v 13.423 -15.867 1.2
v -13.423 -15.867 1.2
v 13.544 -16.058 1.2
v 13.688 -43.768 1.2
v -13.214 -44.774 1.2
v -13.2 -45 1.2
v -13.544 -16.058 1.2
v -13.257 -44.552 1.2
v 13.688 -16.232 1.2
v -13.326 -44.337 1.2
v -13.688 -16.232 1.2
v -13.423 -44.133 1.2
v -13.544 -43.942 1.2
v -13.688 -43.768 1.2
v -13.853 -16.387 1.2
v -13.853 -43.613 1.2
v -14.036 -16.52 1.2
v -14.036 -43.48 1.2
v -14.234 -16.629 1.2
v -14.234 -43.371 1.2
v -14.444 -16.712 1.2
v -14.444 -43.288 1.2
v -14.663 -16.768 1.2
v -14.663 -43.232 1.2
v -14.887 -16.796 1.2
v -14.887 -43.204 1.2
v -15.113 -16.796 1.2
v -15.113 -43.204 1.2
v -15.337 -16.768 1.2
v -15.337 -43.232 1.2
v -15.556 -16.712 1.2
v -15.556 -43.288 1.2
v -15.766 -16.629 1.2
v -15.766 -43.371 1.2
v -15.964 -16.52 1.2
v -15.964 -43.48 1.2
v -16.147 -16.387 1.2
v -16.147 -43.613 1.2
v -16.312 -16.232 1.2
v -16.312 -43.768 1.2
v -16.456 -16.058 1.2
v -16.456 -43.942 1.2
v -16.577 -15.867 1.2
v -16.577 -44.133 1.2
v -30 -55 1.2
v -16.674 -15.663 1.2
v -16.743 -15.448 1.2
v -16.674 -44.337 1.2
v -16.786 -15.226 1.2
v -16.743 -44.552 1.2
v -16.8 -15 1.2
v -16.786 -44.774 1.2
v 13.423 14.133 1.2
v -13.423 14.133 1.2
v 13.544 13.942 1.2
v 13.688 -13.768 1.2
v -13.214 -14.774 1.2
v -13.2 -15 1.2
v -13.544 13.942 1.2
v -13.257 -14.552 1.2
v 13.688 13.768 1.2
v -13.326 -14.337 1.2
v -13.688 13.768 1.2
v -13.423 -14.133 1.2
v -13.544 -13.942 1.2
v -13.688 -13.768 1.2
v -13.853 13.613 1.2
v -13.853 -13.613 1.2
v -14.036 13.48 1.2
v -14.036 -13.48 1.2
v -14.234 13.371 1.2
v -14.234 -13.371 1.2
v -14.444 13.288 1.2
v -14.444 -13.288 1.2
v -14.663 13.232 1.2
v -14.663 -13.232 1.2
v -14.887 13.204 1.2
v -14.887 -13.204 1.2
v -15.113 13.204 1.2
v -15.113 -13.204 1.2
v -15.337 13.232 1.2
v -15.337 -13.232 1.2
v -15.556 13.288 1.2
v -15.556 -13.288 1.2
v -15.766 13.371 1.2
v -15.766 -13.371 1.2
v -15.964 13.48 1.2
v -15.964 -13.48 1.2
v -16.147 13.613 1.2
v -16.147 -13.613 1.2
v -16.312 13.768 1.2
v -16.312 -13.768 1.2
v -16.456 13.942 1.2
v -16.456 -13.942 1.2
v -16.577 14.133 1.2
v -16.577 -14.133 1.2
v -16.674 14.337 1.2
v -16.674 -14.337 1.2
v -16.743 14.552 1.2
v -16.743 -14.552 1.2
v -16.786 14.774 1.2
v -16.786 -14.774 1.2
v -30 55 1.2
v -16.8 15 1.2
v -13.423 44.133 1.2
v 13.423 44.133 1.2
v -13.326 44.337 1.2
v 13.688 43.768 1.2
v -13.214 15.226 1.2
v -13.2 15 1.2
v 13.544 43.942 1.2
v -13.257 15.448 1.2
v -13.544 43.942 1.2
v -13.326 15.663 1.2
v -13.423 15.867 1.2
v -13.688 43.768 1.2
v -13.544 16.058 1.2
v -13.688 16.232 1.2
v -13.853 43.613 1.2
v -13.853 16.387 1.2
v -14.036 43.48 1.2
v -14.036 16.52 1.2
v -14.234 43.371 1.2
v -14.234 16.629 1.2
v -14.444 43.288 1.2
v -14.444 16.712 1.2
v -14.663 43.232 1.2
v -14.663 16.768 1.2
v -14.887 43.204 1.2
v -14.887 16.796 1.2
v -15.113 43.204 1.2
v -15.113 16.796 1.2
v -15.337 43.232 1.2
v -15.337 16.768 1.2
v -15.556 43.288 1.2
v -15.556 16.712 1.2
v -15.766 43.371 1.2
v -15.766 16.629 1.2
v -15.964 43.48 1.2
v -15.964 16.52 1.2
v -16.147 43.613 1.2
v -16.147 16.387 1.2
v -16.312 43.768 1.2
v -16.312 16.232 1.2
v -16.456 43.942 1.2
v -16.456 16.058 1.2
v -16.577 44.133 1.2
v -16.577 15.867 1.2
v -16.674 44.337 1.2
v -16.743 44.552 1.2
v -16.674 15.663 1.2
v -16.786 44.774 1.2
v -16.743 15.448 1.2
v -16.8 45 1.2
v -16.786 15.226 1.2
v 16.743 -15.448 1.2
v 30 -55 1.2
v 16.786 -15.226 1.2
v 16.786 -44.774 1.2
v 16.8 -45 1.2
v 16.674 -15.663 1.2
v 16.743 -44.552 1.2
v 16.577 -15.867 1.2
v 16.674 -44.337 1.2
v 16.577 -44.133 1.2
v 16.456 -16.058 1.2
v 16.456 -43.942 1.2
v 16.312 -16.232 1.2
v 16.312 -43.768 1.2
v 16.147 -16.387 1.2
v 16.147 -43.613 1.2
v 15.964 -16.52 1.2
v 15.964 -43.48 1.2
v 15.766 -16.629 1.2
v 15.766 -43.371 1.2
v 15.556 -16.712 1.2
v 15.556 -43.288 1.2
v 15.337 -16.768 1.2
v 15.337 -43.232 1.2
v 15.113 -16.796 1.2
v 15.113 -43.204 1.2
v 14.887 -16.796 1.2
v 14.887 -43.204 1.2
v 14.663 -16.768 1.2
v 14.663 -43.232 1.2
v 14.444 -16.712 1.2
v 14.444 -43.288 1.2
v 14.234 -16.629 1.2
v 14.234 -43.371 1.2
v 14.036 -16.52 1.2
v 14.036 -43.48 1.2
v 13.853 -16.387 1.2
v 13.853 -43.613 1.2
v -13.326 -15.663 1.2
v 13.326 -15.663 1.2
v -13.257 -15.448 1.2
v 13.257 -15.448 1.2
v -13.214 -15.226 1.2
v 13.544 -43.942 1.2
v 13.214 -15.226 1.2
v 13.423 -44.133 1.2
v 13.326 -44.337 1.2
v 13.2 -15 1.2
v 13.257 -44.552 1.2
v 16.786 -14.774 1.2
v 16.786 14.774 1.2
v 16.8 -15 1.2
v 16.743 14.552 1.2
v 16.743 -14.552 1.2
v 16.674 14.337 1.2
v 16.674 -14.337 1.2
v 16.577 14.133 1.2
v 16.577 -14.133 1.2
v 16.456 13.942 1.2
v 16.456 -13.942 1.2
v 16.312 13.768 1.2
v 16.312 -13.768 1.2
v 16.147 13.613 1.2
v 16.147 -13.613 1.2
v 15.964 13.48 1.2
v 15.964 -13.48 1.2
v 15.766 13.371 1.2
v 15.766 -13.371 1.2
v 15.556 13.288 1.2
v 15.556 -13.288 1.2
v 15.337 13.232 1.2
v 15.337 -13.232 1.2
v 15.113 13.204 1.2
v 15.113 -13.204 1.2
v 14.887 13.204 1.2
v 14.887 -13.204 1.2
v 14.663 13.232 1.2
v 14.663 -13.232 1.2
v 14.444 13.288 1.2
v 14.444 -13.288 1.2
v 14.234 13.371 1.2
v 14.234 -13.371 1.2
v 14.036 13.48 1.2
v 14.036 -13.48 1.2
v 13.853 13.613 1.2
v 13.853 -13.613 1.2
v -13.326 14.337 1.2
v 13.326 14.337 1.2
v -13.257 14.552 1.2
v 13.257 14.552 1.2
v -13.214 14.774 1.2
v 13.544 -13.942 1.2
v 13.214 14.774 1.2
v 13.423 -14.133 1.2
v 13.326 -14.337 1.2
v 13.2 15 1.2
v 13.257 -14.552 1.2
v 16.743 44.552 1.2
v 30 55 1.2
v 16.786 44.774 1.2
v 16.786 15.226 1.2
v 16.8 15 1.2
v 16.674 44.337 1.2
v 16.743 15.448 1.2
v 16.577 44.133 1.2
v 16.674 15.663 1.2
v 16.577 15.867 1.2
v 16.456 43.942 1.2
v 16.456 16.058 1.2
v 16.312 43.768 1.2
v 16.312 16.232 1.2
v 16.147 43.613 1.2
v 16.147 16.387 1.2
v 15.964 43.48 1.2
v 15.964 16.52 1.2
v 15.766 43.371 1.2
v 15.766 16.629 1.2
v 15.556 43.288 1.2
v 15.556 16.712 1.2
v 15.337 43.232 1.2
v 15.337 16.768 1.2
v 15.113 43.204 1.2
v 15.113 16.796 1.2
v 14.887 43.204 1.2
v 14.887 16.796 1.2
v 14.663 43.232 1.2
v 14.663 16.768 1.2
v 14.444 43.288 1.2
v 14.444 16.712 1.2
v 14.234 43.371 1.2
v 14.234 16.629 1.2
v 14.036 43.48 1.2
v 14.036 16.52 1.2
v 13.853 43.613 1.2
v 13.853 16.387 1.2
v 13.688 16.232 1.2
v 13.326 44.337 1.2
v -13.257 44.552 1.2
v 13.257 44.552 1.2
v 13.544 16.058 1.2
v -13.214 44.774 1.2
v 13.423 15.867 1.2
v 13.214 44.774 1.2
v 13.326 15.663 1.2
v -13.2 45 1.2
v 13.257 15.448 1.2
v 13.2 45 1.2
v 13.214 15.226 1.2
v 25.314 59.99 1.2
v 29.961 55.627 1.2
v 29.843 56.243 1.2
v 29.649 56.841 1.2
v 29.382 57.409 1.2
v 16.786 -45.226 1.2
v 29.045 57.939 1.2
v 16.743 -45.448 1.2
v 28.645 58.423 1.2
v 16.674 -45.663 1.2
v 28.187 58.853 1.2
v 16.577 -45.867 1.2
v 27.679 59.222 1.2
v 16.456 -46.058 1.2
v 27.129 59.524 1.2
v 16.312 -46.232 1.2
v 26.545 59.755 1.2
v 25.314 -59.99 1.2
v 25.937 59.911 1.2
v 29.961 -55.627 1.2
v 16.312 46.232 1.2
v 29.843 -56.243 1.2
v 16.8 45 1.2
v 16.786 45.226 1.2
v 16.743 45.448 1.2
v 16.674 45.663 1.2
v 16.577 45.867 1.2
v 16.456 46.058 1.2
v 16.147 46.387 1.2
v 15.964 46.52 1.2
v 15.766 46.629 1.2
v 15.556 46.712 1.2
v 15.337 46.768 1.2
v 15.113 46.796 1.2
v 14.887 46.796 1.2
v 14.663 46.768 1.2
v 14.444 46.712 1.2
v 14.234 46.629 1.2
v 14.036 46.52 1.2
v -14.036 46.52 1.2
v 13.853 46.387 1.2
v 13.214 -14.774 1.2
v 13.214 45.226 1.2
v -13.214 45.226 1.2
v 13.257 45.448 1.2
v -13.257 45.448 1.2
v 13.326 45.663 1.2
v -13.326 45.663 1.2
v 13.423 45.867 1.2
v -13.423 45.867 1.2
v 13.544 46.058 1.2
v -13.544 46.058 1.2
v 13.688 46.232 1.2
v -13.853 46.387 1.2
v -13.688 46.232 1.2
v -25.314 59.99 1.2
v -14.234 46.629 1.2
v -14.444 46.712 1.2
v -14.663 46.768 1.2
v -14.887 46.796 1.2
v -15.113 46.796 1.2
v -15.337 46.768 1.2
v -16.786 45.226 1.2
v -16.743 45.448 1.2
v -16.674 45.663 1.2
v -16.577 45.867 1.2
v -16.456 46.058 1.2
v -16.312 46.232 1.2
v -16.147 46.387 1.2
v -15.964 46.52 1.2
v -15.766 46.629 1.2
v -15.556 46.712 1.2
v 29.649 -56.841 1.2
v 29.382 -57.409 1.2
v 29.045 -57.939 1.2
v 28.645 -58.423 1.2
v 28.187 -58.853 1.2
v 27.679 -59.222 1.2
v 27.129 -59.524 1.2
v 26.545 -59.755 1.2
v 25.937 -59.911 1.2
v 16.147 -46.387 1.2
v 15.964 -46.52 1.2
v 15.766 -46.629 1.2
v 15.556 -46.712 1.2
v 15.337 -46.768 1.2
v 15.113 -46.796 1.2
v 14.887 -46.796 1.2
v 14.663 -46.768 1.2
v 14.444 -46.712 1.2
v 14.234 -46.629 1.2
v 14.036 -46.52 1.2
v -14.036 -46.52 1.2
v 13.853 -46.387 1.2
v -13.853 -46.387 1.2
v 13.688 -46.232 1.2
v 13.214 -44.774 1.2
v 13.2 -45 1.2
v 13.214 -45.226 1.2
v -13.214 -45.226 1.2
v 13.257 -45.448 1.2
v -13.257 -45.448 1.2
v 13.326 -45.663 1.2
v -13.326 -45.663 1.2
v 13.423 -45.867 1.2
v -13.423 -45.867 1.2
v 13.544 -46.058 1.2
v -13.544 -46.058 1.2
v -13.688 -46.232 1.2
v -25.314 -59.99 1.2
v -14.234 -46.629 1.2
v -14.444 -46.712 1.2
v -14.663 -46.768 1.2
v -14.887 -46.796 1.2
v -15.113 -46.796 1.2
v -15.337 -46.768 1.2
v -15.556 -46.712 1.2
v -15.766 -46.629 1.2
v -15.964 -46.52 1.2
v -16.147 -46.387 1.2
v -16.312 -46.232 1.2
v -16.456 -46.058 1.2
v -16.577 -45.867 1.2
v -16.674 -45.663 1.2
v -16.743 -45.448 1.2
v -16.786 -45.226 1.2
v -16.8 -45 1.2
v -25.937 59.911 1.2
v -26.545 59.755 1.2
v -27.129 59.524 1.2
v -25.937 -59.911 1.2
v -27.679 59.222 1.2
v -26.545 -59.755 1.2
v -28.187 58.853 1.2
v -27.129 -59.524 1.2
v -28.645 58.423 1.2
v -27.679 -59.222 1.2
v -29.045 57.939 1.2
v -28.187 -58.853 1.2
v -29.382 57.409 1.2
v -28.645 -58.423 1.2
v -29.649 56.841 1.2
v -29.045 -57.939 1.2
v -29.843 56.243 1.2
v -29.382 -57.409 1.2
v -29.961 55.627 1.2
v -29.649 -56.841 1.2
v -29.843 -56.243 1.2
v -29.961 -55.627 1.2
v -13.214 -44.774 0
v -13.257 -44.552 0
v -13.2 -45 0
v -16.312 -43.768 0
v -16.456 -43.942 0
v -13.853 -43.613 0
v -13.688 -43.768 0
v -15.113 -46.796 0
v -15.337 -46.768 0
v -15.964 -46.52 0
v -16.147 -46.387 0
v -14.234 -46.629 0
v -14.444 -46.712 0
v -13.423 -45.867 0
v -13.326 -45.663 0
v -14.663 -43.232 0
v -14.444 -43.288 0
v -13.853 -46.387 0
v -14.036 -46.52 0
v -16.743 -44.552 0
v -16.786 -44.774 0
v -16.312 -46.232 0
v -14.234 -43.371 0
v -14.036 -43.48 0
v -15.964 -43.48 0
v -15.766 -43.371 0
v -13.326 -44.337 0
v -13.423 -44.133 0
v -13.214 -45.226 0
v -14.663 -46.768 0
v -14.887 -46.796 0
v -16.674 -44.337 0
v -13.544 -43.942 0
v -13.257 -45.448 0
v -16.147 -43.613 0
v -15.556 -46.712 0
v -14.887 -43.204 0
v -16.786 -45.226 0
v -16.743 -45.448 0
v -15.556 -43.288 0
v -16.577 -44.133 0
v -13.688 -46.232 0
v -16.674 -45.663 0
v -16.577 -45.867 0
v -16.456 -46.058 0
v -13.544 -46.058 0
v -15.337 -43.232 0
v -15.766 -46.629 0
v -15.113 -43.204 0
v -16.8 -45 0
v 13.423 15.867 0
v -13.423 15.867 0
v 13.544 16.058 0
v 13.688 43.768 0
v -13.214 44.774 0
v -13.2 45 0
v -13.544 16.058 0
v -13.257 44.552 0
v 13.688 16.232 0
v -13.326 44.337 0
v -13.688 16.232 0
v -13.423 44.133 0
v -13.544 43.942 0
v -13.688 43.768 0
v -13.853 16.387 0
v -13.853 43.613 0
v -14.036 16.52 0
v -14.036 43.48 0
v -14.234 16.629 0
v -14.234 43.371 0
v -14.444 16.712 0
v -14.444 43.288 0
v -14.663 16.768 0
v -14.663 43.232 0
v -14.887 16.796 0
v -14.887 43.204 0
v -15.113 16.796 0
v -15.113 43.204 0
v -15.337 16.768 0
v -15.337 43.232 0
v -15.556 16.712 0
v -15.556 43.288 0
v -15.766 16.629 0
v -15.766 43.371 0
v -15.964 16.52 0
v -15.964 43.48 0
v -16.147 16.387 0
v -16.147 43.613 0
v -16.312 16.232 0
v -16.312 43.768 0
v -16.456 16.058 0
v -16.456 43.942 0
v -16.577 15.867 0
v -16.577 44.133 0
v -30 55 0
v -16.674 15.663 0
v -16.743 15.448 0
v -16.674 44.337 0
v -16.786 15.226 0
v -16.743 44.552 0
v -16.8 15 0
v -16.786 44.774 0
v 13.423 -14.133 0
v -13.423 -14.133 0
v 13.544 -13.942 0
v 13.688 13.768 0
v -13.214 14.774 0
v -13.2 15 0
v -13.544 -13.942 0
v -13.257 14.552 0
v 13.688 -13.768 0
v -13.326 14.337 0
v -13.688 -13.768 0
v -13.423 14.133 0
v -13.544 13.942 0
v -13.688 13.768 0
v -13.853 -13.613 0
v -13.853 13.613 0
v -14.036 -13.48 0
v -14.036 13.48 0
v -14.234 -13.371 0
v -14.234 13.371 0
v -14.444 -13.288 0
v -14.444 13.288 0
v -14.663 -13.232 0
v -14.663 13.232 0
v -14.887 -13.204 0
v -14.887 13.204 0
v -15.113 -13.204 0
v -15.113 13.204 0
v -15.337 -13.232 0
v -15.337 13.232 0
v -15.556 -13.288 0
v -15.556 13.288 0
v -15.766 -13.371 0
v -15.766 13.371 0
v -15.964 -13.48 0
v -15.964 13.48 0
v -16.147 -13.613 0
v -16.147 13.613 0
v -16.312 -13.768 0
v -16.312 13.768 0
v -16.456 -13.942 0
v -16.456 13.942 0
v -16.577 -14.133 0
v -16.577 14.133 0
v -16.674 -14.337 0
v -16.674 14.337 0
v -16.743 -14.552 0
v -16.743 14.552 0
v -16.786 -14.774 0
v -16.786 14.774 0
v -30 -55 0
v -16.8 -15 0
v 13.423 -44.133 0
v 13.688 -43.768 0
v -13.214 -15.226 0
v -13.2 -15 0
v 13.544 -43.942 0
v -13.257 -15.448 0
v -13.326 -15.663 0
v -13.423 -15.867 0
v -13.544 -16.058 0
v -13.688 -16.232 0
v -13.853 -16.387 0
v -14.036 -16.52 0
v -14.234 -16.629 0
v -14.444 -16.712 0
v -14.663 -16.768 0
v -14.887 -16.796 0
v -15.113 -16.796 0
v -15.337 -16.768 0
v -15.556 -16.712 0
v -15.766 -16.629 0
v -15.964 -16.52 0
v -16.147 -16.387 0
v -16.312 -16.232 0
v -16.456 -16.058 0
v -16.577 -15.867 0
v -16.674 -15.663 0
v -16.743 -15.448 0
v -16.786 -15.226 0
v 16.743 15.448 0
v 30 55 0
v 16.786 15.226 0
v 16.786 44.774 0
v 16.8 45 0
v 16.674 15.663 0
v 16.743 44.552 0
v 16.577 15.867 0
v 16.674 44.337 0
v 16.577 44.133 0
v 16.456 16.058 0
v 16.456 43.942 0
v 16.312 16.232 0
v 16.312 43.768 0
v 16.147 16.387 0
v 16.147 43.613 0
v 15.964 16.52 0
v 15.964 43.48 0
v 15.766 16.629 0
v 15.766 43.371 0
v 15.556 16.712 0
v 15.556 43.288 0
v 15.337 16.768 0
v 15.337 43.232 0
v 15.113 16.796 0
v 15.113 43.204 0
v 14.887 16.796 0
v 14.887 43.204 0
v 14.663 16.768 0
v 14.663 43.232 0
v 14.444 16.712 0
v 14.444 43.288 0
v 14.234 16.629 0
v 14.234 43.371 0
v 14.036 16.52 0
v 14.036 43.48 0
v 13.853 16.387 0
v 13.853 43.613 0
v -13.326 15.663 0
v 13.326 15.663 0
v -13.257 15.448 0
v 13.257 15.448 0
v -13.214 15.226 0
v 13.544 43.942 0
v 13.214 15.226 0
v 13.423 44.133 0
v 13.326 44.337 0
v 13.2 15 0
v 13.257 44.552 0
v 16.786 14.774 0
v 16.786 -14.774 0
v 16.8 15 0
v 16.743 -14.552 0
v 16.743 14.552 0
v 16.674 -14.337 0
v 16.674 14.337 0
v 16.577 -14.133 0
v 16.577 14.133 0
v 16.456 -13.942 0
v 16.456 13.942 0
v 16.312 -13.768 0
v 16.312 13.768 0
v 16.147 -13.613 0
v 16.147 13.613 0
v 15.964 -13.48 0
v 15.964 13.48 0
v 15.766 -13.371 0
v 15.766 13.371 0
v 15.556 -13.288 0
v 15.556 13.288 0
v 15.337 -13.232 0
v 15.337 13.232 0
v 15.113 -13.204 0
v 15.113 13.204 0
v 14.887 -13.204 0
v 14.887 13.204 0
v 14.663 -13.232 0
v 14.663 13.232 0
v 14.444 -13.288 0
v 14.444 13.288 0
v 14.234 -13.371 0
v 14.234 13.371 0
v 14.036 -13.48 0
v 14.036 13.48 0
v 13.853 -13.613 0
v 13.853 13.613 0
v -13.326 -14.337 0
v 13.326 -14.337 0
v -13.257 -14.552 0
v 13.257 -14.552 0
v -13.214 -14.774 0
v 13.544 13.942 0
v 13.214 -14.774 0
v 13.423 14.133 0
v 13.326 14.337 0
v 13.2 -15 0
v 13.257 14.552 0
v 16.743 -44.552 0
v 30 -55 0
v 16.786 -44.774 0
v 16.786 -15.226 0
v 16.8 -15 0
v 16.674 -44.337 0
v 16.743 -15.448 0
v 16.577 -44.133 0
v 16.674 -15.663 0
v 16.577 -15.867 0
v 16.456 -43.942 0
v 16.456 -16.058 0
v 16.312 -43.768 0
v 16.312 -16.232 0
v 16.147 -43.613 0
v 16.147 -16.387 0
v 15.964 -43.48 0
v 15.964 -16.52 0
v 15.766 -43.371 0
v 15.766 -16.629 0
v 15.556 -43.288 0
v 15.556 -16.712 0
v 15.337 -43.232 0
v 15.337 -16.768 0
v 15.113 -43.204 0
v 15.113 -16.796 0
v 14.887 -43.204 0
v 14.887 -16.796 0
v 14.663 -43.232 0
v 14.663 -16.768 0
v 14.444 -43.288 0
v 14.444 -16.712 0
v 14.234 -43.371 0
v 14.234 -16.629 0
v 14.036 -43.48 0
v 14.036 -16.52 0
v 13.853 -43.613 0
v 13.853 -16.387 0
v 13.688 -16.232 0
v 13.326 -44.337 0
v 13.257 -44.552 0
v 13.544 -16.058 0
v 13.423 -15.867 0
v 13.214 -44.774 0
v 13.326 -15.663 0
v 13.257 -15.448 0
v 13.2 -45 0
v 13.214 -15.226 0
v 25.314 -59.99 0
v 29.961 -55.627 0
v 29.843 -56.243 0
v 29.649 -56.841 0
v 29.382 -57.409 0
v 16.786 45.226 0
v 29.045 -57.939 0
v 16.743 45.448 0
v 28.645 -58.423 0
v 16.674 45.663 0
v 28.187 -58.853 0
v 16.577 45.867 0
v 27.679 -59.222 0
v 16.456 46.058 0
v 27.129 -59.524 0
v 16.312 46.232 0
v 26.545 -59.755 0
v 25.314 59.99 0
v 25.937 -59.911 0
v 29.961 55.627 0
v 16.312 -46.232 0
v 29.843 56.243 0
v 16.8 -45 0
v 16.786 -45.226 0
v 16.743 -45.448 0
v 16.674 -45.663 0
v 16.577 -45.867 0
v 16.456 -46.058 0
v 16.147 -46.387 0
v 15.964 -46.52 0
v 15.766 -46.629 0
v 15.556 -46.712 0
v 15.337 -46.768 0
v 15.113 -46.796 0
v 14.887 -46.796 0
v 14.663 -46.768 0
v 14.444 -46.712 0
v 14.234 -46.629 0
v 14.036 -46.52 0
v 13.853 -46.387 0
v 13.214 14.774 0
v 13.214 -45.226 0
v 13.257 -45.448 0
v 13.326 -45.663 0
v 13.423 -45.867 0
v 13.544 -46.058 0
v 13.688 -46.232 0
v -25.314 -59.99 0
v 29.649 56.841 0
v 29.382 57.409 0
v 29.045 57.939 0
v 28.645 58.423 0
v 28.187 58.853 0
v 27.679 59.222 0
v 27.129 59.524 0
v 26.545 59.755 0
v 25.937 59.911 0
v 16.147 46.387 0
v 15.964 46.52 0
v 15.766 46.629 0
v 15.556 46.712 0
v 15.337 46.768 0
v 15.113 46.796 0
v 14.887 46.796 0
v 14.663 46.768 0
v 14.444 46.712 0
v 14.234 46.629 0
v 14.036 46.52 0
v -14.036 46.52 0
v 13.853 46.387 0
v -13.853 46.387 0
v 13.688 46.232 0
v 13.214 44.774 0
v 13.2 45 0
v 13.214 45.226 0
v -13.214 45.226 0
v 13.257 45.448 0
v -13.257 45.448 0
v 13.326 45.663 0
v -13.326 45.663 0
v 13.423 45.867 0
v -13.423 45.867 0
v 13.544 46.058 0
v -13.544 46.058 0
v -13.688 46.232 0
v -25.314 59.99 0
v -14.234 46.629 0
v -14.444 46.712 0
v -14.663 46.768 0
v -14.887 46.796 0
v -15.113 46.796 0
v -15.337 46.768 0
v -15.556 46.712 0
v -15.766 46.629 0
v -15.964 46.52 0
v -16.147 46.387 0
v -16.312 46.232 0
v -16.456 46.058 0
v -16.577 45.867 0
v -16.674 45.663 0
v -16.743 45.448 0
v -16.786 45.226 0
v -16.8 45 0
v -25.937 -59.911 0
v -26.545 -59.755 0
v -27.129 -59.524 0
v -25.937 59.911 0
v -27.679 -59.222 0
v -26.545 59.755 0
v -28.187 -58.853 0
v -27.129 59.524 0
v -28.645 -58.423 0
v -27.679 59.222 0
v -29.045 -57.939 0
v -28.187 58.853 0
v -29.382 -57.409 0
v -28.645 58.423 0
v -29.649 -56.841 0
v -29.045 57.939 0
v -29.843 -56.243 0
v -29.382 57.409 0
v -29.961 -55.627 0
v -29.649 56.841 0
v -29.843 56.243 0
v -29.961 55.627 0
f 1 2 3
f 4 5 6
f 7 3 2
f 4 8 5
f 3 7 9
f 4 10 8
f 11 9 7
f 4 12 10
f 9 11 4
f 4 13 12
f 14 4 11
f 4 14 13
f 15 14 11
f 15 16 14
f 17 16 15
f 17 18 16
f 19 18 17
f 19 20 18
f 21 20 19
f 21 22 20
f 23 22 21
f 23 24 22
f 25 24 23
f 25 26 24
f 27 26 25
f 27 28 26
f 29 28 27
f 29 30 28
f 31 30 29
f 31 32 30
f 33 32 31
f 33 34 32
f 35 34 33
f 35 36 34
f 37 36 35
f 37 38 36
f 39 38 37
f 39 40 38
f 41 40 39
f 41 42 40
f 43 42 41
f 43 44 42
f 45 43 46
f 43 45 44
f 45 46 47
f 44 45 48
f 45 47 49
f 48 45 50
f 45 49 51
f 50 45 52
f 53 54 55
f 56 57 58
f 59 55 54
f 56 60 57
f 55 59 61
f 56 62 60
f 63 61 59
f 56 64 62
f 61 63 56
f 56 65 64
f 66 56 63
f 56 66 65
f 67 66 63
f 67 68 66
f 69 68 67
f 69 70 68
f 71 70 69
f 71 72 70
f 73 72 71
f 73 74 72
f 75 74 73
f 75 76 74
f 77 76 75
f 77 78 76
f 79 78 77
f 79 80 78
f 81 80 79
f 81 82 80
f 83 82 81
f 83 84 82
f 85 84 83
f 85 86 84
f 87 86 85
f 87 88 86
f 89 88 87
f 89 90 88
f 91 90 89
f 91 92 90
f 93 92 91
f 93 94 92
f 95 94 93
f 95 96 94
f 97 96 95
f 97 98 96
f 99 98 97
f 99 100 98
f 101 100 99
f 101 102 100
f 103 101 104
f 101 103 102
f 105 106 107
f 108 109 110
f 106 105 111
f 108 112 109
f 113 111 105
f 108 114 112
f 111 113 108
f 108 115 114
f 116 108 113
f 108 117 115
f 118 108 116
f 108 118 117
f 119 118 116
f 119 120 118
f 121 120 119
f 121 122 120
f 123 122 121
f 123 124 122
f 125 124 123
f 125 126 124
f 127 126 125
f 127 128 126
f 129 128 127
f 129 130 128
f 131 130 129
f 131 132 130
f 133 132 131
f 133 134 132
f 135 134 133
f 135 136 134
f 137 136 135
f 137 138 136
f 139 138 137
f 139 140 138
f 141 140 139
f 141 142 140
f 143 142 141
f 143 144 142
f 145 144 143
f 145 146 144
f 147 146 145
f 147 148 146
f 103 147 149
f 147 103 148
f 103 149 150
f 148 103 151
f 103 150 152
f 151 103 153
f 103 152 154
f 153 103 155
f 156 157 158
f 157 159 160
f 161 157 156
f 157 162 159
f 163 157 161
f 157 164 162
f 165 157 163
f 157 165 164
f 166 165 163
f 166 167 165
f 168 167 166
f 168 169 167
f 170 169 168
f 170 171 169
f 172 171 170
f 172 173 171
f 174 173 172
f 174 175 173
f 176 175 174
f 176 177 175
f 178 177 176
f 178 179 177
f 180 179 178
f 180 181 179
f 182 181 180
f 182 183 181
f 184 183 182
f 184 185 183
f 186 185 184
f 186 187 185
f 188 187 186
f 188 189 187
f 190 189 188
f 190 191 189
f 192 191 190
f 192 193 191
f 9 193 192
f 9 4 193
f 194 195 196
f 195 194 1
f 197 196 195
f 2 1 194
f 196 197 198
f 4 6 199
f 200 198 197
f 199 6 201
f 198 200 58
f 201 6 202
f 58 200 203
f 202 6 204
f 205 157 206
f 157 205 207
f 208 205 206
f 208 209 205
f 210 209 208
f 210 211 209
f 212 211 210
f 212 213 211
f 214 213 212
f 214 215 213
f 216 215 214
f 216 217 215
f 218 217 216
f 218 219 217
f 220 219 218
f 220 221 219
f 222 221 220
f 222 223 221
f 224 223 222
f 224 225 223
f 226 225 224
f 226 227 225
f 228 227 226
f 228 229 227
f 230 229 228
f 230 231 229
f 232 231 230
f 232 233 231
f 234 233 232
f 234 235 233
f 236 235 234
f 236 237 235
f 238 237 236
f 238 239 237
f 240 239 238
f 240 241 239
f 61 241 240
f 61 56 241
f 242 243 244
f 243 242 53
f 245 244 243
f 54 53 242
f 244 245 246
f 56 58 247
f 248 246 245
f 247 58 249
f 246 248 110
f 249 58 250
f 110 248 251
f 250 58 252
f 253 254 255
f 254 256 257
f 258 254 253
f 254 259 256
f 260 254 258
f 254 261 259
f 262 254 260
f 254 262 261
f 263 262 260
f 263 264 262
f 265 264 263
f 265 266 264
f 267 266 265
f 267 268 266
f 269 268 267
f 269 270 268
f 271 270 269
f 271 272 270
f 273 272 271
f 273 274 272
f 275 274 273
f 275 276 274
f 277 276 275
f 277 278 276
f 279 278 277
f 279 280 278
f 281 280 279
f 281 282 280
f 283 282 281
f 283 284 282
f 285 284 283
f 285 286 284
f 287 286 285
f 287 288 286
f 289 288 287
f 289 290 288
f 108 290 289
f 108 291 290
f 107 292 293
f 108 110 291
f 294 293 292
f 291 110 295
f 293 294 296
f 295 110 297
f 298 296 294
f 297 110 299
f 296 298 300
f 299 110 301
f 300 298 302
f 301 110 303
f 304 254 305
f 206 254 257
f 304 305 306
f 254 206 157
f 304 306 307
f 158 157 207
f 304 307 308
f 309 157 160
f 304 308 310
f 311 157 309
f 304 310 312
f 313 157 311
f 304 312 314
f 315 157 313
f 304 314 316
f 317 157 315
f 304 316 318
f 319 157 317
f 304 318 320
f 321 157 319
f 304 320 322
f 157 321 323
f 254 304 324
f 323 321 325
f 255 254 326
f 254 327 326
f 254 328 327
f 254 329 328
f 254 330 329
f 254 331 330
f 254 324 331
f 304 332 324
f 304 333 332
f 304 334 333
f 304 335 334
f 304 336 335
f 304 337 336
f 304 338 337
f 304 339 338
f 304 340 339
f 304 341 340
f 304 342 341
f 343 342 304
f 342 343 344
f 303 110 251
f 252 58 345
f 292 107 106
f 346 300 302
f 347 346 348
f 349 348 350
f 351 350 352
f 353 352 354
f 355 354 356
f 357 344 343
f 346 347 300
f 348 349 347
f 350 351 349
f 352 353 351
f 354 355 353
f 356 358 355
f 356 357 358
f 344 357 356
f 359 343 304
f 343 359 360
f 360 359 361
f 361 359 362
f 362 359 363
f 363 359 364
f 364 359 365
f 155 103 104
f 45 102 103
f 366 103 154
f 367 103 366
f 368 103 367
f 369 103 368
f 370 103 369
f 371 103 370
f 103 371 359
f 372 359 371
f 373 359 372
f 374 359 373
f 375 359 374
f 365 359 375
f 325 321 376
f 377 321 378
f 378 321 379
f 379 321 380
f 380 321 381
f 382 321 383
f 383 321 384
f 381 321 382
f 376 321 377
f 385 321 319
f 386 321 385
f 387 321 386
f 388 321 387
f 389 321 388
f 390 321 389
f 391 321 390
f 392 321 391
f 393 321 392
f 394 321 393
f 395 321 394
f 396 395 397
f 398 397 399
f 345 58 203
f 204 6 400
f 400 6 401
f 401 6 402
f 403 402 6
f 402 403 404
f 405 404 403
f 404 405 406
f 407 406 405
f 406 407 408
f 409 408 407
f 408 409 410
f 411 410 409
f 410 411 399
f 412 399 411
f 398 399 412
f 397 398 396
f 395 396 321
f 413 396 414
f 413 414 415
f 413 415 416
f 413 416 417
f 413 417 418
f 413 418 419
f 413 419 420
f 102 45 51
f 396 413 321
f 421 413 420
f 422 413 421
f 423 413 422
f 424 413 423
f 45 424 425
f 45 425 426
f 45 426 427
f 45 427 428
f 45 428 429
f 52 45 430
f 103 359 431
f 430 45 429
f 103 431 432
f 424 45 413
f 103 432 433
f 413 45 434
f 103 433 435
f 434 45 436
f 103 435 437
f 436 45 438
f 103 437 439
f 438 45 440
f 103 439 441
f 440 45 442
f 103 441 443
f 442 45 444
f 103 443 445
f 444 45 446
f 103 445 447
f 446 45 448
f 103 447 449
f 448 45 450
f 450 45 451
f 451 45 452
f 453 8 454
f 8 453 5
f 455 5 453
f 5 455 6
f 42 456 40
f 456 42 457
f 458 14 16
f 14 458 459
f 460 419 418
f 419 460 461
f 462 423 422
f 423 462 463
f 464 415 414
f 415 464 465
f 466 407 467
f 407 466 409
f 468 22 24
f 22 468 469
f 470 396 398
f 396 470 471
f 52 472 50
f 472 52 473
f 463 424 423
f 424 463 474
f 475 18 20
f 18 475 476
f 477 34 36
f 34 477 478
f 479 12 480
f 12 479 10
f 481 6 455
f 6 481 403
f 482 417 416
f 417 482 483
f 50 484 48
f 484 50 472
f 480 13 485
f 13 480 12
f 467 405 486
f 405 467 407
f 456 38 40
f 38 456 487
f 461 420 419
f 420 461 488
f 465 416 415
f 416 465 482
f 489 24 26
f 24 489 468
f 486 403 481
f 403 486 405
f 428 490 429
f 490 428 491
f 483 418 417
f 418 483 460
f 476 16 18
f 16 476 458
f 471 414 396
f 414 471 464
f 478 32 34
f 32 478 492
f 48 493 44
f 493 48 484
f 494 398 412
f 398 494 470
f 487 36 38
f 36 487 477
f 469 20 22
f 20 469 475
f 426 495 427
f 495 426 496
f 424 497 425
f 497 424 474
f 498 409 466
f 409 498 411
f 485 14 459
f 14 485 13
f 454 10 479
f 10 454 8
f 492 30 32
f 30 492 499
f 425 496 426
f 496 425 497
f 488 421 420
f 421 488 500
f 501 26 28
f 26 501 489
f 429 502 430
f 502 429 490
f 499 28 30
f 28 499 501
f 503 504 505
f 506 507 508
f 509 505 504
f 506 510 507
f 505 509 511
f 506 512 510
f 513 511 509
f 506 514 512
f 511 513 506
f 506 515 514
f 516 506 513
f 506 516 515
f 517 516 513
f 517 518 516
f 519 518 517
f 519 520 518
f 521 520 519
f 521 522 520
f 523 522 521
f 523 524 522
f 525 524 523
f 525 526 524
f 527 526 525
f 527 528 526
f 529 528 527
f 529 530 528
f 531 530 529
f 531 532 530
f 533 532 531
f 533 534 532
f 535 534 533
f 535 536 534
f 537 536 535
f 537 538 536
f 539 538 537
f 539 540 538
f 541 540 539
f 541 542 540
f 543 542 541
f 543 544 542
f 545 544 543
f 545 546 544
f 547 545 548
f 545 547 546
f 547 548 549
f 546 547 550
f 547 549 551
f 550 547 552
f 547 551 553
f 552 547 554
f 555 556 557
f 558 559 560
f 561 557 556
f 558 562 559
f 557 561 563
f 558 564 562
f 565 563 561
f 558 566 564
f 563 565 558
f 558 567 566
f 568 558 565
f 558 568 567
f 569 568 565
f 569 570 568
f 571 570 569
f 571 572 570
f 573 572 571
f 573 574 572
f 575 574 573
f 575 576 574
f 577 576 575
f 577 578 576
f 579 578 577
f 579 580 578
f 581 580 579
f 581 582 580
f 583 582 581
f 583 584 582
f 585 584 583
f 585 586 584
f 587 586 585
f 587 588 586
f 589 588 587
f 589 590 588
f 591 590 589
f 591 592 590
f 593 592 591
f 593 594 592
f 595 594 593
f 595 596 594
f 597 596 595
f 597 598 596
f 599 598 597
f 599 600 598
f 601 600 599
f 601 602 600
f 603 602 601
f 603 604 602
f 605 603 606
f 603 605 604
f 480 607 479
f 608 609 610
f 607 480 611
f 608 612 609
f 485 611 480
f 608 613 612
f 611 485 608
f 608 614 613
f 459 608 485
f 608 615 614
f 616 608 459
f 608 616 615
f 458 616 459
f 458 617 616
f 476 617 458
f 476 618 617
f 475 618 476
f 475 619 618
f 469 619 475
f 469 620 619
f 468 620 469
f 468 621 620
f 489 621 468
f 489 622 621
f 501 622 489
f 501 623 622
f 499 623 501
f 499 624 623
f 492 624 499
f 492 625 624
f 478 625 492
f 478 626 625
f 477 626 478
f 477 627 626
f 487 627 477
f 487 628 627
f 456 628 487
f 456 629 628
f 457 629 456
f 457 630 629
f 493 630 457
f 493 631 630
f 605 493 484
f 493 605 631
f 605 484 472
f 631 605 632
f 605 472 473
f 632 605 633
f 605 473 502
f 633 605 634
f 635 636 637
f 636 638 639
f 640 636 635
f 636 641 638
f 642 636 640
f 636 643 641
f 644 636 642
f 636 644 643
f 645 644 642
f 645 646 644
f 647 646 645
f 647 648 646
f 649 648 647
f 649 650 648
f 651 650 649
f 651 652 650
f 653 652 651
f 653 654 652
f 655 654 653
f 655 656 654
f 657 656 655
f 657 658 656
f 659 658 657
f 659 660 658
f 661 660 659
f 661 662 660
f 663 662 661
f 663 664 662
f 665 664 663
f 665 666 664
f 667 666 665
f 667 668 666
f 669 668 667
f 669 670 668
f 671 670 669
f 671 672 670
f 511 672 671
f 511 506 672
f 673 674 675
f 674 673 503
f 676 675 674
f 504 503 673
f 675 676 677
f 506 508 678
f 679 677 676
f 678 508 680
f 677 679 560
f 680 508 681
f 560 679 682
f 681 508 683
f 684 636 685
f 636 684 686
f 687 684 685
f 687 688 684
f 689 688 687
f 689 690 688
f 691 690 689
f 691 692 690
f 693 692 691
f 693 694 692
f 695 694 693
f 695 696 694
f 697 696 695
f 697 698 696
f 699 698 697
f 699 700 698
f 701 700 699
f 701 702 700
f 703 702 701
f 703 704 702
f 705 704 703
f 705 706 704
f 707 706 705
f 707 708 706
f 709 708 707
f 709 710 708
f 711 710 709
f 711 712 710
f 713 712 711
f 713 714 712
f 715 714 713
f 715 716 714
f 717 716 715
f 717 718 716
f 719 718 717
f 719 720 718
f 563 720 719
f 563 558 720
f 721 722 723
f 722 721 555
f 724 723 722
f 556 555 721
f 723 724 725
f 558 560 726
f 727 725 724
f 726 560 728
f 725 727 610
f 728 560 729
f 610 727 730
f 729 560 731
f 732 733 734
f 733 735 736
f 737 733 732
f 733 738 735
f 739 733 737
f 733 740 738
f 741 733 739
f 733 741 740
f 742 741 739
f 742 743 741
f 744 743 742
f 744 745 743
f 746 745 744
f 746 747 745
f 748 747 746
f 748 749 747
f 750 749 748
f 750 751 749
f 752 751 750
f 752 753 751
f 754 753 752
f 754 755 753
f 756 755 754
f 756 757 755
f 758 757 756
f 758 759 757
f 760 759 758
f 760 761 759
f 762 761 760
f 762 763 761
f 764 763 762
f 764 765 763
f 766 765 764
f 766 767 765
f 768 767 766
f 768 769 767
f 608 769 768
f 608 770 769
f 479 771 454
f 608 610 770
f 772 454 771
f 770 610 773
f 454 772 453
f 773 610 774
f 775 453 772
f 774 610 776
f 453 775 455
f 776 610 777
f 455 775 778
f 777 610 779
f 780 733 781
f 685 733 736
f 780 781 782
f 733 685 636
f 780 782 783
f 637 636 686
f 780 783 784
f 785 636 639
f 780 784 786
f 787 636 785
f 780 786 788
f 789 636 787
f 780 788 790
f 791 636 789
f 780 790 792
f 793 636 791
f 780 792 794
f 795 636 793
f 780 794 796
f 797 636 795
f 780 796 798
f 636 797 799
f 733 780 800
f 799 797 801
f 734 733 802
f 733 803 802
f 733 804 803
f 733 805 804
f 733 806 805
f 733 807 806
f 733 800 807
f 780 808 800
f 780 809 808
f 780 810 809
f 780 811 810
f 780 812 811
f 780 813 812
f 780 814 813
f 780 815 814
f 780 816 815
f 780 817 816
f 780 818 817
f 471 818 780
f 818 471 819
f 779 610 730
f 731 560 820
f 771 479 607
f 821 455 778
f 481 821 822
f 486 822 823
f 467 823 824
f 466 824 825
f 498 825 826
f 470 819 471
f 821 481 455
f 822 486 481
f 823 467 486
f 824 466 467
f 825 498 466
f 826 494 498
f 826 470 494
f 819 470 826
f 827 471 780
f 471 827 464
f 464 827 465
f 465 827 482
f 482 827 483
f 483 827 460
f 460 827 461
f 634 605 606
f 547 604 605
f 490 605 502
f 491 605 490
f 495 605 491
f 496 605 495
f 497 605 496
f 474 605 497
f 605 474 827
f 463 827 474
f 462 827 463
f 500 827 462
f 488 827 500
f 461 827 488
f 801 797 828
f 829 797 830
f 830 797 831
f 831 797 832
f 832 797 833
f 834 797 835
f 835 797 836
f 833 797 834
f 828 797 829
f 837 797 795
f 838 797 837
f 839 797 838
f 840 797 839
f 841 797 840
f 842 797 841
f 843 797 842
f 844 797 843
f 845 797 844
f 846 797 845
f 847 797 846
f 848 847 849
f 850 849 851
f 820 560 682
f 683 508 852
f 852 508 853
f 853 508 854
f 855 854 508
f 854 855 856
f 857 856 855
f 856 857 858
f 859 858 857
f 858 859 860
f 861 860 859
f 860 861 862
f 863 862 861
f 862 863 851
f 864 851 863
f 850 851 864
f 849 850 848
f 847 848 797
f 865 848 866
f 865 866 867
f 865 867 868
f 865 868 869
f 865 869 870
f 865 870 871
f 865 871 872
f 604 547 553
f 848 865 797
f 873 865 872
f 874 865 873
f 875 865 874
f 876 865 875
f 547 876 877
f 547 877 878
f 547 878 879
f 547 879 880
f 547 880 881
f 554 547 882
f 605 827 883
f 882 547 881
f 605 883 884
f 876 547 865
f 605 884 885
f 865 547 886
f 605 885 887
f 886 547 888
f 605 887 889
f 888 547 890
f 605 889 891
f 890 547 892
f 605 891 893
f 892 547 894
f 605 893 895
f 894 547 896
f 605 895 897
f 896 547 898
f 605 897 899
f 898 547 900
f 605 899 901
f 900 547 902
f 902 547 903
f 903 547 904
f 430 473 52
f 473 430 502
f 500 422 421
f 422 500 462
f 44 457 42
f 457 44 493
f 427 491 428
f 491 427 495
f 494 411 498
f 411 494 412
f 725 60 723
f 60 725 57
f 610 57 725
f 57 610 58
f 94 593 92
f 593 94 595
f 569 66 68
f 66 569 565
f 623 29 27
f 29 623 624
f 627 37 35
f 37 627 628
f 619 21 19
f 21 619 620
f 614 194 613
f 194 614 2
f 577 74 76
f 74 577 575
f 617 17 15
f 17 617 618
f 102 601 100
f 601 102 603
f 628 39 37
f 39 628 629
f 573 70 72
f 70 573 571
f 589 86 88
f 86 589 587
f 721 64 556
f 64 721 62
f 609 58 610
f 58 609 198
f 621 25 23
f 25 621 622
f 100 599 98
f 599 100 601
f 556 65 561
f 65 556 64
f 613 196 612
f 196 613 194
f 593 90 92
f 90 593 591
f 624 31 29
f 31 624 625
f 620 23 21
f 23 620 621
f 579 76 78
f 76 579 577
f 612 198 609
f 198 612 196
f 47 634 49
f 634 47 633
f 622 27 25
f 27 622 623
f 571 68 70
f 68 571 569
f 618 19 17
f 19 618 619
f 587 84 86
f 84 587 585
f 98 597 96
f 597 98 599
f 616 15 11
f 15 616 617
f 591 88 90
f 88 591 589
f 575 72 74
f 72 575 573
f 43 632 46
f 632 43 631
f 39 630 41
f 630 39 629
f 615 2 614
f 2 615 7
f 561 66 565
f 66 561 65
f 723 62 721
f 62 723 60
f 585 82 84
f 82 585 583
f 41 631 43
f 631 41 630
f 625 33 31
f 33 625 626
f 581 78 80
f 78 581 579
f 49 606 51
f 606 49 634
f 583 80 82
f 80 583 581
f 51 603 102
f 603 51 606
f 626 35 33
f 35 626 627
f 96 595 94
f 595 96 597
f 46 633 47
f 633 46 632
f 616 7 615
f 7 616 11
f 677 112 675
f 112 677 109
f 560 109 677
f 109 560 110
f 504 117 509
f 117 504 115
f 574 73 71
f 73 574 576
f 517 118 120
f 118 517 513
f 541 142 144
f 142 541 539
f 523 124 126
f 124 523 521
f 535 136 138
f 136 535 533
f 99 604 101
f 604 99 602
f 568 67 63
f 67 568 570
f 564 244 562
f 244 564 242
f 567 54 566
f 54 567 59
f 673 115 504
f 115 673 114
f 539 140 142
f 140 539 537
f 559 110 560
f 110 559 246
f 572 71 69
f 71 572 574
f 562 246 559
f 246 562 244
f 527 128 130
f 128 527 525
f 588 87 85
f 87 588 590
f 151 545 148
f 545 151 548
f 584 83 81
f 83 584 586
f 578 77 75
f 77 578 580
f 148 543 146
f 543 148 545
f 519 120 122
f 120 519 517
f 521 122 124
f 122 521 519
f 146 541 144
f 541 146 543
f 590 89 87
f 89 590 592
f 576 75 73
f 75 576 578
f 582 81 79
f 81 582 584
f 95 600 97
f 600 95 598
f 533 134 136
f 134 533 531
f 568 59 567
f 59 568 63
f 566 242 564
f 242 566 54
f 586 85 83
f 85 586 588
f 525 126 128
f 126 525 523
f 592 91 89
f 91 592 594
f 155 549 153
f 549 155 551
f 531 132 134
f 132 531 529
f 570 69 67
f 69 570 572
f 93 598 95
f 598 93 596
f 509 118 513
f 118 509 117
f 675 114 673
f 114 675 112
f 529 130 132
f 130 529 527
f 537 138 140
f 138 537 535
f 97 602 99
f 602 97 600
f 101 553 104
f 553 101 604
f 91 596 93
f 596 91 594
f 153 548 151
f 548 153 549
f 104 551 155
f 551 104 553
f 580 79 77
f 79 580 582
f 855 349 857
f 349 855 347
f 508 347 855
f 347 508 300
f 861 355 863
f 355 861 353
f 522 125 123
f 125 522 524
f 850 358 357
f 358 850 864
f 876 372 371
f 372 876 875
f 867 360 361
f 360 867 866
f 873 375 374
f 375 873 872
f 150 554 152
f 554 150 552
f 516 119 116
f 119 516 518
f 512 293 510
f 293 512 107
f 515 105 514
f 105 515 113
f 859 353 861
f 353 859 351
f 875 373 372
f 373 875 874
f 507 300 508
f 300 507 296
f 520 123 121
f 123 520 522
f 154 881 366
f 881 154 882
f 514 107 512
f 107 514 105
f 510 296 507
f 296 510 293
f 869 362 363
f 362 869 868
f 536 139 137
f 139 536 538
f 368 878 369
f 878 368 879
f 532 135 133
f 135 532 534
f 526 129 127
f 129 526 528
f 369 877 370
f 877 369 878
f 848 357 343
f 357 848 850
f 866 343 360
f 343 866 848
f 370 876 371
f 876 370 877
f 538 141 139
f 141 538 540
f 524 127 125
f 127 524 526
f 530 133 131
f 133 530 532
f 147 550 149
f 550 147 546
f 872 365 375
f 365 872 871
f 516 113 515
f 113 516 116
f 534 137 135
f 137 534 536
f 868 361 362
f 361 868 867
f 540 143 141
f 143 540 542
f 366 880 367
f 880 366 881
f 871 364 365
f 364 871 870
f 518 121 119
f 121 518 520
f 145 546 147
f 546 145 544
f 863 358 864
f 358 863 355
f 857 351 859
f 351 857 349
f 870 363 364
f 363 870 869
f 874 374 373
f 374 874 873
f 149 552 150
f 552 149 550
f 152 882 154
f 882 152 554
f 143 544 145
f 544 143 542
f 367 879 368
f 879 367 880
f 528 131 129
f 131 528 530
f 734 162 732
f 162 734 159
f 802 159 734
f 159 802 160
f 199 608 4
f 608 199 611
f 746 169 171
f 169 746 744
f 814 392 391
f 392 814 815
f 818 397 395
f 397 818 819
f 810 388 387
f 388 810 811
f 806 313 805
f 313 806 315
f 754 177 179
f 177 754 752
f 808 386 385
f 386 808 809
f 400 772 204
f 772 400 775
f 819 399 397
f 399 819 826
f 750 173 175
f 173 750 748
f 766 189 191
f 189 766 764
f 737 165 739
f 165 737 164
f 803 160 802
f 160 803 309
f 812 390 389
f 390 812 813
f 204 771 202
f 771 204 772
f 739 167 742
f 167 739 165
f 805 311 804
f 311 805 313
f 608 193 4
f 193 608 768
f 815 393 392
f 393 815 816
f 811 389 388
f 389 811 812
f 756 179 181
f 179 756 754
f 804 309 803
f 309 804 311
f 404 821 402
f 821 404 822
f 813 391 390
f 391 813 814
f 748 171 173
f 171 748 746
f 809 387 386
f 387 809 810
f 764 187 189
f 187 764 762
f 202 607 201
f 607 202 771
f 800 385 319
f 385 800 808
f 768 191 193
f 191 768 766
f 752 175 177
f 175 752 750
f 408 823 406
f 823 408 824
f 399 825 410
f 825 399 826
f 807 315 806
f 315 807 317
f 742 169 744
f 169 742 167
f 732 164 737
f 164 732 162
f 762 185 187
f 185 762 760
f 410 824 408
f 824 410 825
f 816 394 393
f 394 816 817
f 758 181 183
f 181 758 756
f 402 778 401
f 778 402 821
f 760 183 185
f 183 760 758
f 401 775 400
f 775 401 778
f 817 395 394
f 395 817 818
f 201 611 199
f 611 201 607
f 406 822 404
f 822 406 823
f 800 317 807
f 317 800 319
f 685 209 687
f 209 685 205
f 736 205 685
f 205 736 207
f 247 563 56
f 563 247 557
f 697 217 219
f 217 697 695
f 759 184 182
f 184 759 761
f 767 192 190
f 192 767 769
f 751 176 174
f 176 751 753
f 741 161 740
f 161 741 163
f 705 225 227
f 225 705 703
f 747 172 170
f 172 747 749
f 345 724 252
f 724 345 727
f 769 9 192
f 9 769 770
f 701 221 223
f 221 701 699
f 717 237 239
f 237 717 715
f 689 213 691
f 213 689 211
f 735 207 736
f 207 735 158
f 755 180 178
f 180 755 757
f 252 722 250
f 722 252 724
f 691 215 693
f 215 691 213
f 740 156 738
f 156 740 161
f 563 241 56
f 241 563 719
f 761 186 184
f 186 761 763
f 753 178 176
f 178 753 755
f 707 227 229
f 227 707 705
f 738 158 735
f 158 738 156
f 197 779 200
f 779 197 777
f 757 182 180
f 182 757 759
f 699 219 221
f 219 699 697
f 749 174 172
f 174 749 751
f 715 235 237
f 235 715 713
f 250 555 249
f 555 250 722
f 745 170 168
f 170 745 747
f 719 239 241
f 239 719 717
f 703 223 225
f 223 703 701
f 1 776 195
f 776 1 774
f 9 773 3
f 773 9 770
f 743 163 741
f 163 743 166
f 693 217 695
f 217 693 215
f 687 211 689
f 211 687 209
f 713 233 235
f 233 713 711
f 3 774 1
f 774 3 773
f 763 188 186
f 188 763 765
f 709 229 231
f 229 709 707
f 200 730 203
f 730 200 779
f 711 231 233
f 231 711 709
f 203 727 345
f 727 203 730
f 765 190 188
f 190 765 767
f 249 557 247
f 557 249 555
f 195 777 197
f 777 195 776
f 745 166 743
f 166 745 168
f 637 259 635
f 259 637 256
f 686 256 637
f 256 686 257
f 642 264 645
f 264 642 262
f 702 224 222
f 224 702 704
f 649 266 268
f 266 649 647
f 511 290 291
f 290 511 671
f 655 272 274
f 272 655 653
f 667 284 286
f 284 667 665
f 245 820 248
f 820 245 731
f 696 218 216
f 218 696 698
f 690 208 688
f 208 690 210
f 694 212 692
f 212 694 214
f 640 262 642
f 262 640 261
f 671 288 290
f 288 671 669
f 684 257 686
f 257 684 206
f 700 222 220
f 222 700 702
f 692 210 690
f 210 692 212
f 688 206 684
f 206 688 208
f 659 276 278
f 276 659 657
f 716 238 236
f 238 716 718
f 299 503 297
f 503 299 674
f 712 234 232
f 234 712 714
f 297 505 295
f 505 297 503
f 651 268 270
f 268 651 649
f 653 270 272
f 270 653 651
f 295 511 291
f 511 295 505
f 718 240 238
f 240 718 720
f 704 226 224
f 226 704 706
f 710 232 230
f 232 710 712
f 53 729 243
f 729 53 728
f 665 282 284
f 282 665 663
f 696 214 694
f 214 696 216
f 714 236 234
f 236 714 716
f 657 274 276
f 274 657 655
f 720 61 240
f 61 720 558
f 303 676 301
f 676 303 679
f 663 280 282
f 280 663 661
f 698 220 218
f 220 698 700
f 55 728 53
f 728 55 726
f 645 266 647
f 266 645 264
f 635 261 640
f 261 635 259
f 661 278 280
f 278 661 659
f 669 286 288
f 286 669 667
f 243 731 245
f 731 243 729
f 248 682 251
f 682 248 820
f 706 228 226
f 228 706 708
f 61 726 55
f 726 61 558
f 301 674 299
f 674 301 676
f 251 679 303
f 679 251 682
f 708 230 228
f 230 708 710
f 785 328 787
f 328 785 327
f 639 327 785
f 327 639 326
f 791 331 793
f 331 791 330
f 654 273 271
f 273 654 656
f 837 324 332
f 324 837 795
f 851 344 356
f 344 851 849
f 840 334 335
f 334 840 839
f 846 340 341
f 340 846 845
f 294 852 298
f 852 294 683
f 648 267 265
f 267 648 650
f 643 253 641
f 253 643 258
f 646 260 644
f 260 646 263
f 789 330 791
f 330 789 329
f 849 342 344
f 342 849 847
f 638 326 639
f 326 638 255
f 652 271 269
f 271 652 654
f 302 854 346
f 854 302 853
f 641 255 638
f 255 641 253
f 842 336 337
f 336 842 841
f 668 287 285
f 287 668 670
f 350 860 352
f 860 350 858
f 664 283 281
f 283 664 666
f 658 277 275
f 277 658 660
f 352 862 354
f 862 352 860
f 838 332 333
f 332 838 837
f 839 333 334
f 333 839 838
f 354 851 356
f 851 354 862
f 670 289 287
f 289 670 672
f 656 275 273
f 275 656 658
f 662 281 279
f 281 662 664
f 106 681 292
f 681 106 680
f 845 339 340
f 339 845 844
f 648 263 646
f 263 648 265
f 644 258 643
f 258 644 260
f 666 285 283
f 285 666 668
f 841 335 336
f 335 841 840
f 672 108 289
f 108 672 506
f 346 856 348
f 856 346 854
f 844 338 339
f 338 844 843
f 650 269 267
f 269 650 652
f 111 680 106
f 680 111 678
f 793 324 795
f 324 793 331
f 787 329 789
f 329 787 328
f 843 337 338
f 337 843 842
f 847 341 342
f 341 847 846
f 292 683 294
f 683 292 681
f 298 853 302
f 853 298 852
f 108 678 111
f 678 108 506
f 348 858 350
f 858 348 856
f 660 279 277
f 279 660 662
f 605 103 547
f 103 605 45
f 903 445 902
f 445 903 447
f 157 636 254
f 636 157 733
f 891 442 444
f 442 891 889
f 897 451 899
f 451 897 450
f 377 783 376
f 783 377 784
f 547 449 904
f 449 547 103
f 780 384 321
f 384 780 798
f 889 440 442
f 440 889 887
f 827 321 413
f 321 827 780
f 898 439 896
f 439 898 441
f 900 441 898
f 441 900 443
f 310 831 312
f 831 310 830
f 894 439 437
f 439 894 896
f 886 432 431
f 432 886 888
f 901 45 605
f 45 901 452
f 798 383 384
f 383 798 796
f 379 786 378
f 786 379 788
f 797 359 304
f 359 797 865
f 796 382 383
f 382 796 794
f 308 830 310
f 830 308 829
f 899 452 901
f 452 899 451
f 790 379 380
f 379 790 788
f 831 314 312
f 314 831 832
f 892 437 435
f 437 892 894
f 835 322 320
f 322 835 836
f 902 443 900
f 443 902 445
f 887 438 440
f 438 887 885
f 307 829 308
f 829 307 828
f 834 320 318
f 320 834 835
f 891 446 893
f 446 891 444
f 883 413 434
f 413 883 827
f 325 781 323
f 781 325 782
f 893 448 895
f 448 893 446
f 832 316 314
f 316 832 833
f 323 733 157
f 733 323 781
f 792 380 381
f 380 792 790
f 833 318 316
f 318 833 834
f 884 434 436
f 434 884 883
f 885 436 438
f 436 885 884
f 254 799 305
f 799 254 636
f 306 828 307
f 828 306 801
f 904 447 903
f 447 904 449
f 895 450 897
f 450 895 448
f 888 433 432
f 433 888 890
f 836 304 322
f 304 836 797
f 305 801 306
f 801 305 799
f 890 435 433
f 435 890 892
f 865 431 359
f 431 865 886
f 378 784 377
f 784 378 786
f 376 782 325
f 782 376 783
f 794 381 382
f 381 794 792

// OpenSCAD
$fn = 50;


difference() {
	union() {
		hull() {
			translate(v = [-25.0000000000, 55.0000000000, 0]) {
				cylinder(h = 99, r = 5);
			}
			translate(v = [25.0000000000, 55.0000000000, 0]) {
				cylinder(h = 99, r = 5);
			}
			translate(v = [-25.0000000000, -55.0000000000, 0]) {
				cylinder(h = 99, r = 5);
			}
			translate(v = [25.0000000000, -55.0000000000, 0]) {
				cylinder(h = 99, r = 5);
			}
		}
	}
	union() {
		translate(v = [0, 0, 1.2000000000]) {
			hull() {
				translate(v = [-25.0000000000, 55.0000000000, 0]) {
					cylinder(h = 97.8000000000, r = 3.8000000000);
				}
				translate(v = [25.0000000000, 55.0000000000, 0]) {
					cylinder(h = 97.8000000000, r = 3.8000000000);
				}
				translate(v = [-25.0000000000, -55.0000000000, 0]) {
					cylinder(h = 97.8000000000, r = 3.8000000000);
				}
				translate(v = [25.0000000000, -55.0000000000, 0]) {
					cylinder(h = 97.8000000000, r = 3.8000000000);
				}
			}
		}
		#translate(v = [-15.0000000000, -45.0000000000, 0]) {
			cylinder(h = 1.2000000000, r = 1.8000000000);
		}
		#translate(v = [-15.0000000000, -15.0000000000, 0]) {
			cylinder(h = 1.2000000000, r = 1.8000000000);
		}
		#translate(v = [-15.0000000000, 15.0000000000, 0]) {
			cylinder(h = 1.2000000000, r = 1.8000000000);
		}
		#translate(v = [-15.0000000000, 45.0000000000, 0]) {
			cylinder(h = 1.2000000000, r = 1.8000000000);
		}
		#translate(v = [15.0000000000, -45.0000000000, 0]) {
			cylinder(h = 1.2000000000, r = 1.8000000000);
		}
		#translate(v = [15.0000000000, -15.0000000000, 0]) {
			cylinder(h = 1.2000000000, r = 1.8000000000);
		}
		#translate(v = [15.0000000000, 15.0000000000, 0]) {
			cylinder(h = 1.2000000000, r = 1.8000000000);
		}
		#translate(v = [15.0000000000, 45.0000000000, 0]) {
			cylinder(h = 1.2000000000, r = 1.8000000000);
		}
		translate(v = [-250.0000000000, -250.0000000000, 1.2000000000]) {
			cube(size = [500, 500, 500]);
		}
		translate(v = [-250.0000000000, -250.0000000000, 1.2000000000]) {
			cube(size = [500, 500, 500]);
		}
		translate(v = [-250.0000000000, -250.0000000000, 1.2000000000]) {
			cube(size = [500, 500, 500]);
		}
	}
}
